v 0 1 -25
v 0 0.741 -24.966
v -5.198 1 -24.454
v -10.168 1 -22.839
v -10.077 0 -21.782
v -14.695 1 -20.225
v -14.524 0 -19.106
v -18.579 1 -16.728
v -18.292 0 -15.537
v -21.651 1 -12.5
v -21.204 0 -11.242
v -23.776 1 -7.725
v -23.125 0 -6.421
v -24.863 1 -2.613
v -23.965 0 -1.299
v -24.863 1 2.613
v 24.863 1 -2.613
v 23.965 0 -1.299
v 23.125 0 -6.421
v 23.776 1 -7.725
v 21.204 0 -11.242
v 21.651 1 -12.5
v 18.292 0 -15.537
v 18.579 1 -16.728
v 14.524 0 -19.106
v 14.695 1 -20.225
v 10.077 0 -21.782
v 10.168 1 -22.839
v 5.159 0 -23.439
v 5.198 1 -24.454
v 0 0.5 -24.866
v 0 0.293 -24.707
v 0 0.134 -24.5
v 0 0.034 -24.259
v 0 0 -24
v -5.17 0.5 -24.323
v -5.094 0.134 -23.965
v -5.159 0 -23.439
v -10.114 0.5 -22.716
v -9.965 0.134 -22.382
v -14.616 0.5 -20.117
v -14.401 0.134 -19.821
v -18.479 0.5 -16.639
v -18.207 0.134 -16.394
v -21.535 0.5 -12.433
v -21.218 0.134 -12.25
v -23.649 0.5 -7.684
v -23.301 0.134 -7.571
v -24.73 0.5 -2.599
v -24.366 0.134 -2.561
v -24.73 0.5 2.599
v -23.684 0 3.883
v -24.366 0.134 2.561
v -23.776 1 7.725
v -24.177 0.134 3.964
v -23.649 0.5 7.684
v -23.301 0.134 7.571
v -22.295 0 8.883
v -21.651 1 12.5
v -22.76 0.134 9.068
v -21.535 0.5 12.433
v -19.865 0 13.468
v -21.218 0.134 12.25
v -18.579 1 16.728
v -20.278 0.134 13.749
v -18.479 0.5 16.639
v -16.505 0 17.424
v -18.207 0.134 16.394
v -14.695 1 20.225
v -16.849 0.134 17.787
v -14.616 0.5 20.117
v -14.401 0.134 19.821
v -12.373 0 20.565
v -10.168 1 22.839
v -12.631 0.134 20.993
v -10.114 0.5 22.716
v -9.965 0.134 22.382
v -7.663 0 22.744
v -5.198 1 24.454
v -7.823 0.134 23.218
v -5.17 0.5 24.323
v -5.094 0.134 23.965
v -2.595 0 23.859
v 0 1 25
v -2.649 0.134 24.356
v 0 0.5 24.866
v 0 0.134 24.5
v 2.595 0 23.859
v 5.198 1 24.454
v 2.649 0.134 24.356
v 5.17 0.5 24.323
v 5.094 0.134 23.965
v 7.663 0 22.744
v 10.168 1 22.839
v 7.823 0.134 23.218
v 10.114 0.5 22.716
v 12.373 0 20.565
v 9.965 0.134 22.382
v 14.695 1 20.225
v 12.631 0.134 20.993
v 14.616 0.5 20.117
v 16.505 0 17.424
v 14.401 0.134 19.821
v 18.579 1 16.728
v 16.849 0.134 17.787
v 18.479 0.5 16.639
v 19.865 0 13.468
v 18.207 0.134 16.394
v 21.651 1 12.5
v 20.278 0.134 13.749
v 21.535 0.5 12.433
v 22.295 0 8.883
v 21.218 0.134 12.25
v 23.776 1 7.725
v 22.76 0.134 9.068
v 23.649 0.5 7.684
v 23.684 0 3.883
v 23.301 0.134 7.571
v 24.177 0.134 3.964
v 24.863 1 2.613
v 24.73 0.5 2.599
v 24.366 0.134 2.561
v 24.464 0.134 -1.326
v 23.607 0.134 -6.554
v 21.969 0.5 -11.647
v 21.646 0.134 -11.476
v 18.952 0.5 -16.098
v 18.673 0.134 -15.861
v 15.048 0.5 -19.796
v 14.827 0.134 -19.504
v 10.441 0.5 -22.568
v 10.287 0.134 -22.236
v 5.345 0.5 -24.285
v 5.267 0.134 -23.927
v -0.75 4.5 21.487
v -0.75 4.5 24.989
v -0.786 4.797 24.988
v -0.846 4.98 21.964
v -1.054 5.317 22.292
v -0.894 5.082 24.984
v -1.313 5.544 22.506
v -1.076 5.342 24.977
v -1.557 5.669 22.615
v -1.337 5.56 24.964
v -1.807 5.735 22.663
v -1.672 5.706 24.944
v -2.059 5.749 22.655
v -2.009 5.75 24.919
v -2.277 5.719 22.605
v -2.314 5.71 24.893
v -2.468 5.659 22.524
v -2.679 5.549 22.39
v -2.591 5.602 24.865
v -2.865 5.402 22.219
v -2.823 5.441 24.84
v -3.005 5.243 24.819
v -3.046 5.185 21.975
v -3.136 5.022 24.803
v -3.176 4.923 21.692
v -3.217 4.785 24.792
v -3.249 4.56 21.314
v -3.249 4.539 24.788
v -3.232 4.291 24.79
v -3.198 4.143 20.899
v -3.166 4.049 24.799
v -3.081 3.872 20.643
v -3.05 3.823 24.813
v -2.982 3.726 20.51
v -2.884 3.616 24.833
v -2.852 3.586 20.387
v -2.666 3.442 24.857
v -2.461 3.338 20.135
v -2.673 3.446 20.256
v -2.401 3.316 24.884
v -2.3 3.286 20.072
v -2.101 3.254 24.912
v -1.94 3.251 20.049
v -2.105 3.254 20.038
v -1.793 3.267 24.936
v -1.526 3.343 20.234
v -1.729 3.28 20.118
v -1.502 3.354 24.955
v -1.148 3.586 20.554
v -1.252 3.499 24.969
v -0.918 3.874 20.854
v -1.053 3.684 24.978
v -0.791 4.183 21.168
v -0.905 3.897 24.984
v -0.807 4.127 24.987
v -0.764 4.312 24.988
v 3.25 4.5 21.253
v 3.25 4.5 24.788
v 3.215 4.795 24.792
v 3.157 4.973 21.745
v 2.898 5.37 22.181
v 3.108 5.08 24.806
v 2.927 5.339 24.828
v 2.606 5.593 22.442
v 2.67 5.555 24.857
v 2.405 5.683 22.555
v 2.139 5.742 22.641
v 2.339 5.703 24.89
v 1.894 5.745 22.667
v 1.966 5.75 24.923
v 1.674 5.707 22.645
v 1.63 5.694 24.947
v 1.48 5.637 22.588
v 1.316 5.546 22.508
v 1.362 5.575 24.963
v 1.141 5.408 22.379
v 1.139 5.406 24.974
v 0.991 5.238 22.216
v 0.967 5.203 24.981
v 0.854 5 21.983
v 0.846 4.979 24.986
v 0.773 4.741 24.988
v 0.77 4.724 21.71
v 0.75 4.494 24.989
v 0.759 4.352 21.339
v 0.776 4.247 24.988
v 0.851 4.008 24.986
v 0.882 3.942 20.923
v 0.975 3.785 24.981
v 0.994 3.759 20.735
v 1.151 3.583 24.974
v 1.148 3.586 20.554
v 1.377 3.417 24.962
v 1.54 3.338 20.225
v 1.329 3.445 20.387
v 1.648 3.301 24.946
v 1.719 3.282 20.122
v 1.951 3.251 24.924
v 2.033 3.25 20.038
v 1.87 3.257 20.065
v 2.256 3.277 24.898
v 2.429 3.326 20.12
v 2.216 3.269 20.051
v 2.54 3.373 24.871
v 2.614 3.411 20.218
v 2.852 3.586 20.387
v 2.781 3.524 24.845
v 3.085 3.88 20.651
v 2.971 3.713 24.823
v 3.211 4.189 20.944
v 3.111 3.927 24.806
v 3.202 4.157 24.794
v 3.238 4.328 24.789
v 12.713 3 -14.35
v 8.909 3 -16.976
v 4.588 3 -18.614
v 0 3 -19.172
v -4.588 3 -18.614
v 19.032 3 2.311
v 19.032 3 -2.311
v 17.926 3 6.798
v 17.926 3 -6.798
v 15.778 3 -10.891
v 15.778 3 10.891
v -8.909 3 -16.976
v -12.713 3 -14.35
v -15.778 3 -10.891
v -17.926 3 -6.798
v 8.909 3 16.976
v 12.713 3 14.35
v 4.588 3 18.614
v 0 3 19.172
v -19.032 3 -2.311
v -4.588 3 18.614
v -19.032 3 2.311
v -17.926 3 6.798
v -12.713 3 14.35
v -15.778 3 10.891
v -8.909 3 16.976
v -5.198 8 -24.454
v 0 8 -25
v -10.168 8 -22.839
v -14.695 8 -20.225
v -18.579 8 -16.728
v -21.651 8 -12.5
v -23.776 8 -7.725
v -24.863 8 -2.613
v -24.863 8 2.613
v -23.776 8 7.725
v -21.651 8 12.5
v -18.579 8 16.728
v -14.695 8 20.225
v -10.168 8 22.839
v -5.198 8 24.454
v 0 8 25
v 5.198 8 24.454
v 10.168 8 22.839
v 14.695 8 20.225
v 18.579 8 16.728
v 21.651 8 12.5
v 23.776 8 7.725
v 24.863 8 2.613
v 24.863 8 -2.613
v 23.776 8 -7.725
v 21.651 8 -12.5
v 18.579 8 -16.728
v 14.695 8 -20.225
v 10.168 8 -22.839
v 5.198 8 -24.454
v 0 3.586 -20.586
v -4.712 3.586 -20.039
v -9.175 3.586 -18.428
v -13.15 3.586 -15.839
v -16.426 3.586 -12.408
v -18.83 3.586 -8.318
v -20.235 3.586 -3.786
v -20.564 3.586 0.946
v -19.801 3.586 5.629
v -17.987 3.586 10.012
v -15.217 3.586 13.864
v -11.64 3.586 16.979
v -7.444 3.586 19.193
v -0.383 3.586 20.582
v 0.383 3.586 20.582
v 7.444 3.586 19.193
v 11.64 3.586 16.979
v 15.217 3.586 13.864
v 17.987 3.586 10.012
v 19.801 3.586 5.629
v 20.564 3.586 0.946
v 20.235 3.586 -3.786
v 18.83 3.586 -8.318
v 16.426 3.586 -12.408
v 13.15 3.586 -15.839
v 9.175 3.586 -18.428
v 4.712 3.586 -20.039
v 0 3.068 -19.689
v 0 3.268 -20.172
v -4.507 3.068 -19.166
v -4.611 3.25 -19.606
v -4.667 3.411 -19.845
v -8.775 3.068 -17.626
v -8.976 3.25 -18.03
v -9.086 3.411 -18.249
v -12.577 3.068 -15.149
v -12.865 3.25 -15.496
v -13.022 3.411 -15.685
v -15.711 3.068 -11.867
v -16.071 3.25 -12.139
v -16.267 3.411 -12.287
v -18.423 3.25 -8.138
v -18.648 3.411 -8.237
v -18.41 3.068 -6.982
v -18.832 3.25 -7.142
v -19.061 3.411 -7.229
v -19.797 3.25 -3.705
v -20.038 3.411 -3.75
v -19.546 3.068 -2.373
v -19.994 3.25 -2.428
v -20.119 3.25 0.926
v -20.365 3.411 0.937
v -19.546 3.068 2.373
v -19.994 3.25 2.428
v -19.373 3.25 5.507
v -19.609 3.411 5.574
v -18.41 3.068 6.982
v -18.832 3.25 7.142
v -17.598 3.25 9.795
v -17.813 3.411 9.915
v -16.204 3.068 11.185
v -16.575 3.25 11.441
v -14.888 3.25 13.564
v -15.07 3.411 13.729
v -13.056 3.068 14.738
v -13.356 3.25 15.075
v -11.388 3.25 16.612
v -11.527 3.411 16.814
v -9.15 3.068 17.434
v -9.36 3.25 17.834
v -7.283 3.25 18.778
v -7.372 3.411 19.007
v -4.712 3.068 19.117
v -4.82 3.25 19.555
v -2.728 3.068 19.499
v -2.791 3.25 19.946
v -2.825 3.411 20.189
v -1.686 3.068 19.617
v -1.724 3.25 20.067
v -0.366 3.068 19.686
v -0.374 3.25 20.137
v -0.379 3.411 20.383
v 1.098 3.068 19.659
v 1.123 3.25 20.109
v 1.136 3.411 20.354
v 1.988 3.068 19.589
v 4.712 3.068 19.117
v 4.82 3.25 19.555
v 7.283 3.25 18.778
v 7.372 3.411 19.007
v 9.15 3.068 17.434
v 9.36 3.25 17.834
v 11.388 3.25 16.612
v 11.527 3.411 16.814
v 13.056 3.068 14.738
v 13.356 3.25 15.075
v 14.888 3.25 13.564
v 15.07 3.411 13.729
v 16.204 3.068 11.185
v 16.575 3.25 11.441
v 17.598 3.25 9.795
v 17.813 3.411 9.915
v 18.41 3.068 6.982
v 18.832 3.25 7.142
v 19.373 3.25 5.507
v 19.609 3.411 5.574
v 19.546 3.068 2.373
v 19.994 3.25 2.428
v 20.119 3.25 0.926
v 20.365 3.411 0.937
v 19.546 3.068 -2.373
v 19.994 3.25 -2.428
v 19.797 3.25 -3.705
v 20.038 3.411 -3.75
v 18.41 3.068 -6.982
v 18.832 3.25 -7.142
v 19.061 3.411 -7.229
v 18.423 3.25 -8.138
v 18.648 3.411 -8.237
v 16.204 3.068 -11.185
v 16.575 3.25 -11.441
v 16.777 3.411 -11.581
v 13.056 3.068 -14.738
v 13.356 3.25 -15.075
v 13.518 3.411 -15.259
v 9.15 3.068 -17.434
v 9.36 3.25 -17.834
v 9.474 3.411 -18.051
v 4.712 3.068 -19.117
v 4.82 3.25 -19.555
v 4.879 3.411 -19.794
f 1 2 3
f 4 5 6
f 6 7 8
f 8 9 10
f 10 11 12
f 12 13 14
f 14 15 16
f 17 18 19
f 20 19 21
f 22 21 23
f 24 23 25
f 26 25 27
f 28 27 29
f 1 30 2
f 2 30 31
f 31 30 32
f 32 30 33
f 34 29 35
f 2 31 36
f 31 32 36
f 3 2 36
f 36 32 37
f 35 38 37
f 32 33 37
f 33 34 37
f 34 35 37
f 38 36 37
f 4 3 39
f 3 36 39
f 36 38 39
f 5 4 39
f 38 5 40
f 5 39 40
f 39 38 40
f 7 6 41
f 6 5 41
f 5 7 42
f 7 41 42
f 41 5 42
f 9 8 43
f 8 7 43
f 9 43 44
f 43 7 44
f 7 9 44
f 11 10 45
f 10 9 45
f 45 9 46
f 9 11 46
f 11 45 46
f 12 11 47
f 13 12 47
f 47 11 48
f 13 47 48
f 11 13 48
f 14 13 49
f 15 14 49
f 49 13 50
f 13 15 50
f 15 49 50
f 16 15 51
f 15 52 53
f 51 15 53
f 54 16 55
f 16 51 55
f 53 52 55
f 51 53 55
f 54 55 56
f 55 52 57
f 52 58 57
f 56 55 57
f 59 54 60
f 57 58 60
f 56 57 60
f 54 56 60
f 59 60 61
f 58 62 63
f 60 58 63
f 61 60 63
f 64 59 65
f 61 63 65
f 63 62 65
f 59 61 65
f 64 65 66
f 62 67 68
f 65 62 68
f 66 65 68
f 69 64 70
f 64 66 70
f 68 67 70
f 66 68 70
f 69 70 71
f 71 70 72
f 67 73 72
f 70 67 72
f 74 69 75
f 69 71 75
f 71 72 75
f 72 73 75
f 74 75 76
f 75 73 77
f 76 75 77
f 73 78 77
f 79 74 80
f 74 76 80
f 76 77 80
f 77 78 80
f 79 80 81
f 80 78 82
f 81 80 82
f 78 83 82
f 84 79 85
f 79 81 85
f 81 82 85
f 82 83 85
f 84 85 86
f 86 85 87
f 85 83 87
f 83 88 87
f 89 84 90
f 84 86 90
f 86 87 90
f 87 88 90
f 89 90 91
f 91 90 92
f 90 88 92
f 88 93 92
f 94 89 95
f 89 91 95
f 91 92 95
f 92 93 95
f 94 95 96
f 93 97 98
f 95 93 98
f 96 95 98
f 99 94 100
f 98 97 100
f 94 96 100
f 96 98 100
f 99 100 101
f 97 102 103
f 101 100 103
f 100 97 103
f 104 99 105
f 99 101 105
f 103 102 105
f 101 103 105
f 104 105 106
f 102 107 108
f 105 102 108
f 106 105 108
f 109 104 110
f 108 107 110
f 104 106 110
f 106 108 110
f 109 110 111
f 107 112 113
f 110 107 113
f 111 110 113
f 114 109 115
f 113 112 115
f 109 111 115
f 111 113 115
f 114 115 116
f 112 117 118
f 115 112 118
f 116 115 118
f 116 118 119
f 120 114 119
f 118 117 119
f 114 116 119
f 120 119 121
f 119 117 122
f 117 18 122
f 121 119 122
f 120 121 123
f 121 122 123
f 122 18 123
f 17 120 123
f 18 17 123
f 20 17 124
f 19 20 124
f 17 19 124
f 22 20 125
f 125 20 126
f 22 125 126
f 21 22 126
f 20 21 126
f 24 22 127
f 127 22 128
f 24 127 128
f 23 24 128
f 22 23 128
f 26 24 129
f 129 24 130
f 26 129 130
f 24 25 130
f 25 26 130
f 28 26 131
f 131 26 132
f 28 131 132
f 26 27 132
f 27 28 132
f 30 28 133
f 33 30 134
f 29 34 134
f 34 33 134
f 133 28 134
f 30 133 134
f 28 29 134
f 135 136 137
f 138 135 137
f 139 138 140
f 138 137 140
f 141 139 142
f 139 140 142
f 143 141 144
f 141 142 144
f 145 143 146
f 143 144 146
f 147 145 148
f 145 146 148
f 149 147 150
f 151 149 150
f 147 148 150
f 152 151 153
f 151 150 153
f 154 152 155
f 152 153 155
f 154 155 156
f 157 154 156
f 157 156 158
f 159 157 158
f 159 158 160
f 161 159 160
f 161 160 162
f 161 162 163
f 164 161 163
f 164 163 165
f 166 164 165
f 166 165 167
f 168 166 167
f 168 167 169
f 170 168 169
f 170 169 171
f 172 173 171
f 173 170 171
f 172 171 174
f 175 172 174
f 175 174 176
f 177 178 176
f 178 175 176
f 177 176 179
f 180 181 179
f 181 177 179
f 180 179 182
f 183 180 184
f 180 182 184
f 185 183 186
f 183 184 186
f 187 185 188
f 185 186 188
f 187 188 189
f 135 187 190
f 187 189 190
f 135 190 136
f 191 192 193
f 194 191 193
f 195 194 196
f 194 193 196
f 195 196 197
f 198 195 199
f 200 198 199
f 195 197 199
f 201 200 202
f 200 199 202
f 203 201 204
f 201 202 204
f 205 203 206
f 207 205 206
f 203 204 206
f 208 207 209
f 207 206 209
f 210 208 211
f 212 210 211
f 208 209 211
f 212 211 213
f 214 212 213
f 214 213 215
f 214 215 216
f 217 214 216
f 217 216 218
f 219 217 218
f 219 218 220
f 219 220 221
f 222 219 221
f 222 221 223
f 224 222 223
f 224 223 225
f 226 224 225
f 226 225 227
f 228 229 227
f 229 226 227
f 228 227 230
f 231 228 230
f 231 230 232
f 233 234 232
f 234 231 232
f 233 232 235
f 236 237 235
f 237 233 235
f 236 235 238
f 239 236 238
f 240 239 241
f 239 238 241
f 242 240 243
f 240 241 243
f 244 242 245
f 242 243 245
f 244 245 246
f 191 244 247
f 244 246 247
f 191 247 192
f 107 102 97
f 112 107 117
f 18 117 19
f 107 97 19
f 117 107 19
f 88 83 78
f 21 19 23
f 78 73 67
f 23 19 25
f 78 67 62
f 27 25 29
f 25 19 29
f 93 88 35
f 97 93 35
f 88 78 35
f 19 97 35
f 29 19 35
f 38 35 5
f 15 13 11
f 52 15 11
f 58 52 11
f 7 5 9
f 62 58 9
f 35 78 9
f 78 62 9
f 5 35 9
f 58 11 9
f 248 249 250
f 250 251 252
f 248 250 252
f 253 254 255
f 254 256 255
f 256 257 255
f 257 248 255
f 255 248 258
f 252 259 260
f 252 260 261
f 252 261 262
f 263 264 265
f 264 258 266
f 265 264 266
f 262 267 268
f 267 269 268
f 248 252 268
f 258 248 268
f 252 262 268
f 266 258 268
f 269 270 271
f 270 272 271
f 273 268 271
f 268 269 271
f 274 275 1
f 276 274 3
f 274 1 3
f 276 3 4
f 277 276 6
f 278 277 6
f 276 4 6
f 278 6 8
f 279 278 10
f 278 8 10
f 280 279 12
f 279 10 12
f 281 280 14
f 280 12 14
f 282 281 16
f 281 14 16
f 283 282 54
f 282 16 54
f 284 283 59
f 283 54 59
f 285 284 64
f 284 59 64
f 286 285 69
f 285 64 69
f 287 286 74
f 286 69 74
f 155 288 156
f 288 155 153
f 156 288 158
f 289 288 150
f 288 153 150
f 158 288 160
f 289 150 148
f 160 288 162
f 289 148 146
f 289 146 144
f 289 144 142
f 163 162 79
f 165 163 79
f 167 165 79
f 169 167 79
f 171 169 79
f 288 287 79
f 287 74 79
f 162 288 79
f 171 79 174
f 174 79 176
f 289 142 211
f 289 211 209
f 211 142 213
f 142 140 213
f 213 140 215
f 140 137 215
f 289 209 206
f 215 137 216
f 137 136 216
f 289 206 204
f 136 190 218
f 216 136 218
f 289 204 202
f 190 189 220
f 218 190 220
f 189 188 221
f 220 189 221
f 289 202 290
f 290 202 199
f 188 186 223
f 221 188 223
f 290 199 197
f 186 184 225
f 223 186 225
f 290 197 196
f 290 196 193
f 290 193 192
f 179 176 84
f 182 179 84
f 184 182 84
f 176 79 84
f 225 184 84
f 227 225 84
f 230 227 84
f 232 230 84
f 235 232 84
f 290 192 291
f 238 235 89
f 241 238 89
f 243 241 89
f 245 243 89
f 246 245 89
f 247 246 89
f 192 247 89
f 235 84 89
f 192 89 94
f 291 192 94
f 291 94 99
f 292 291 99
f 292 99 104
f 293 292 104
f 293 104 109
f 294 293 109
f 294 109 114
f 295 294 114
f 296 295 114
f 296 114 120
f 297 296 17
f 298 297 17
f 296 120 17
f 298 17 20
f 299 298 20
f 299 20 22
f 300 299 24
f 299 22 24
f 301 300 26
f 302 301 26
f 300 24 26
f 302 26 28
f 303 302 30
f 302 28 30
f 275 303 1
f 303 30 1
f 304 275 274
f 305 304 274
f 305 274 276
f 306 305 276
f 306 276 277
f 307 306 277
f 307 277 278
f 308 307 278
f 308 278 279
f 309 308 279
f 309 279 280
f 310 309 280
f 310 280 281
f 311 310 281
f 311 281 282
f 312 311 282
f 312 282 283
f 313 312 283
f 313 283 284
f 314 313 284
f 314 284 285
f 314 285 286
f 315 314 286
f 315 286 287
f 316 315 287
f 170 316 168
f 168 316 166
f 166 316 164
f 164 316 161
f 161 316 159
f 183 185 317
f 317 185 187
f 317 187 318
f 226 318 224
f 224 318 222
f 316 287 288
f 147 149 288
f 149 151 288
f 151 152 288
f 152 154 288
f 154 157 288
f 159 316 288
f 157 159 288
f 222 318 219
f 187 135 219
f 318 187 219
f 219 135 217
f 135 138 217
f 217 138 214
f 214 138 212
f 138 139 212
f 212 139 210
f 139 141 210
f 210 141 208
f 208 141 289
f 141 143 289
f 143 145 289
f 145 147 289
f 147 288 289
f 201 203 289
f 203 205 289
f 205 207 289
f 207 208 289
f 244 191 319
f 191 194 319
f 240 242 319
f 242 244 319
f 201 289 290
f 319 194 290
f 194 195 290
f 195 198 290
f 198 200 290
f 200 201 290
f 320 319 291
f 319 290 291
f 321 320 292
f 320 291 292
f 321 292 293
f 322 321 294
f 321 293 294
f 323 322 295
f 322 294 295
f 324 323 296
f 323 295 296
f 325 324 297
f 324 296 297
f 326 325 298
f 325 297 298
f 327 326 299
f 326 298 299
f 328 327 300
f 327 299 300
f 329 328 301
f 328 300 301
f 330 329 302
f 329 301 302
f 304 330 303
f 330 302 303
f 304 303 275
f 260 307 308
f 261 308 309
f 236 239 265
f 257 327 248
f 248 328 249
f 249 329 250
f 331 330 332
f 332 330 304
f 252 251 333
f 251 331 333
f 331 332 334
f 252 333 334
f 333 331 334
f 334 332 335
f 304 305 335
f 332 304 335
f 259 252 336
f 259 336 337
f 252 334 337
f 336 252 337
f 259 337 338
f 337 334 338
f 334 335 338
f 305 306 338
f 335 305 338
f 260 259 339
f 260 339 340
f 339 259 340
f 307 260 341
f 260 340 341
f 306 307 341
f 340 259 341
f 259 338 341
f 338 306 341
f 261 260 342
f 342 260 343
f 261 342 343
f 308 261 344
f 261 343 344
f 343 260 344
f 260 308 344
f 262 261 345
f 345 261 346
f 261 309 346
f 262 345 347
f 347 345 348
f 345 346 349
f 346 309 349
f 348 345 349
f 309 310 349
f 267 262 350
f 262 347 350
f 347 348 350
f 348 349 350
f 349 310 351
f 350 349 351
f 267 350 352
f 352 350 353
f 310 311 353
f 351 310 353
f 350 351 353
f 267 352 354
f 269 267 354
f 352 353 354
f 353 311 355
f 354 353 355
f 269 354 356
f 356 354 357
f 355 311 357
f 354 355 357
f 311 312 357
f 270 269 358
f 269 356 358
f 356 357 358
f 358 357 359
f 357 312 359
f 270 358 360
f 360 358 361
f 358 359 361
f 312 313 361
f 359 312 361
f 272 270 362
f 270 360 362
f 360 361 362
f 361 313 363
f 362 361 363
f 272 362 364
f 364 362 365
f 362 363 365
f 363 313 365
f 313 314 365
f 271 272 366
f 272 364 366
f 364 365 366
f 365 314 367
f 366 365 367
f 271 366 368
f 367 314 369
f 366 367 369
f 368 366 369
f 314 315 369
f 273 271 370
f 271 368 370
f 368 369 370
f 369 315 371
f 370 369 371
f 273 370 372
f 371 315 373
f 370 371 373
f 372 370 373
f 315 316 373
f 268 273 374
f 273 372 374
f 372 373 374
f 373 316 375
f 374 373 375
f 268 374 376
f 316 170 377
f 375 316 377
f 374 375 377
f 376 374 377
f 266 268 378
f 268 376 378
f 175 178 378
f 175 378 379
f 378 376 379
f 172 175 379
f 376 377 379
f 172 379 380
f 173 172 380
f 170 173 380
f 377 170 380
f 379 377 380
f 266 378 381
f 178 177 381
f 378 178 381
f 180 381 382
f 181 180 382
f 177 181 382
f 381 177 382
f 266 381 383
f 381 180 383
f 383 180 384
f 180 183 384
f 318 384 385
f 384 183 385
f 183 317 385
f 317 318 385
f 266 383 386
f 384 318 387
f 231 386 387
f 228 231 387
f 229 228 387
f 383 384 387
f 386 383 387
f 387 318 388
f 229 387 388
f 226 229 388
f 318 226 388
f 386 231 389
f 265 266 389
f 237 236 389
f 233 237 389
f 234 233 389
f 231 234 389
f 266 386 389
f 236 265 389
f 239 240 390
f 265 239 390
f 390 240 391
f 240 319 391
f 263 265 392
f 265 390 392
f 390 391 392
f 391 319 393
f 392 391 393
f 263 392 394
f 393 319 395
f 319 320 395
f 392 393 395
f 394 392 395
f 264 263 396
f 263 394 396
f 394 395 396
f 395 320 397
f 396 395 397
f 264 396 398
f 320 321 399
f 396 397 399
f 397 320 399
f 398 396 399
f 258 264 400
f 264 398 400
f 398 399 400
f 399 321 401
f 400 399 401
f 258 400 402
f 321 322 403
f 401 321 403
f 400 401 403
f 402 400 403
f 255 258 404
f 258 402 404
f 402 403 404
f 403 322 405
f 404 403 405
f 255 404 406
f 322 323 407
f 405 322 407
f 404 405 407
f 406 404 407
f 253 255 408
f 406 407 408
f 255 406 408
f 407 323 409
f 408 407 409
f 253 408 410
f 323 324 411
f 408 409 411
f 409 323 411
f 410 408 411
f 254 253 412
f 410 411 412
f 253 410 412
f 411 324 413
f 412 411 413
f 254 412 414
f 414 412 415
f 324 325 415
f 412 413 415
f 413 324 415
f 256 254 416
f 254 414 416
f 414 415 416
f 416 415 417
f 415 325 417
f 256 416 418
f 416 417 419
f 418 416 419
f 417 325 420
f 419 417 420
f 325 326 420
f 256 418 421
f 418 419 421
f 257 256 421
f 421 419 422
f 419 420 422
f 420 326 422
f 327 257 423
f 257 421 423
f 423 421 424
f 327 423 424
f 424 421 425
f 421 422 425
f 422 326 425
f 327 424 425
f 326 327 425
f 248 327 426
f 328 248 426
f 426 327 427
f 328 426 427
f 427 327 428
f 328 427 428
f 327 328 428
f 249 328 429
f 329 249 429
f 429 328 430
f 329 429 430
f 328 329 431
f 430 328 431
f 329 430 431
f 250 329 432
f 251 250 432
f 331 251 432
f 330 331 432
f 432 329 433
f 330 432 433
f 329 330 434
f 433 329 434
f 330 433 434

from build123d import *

# Parameters (mm, degrees)
CUT_EXTRUDE1_REACH = 58.471
SKETCH5_R          = 1.25


with BuildPart() as part:
    # Sketch3 → Revolve3 (revolve)
    with BuildSketch(Plane.XY, mode=Mode.PRIVATE) as revolve3_sk:
        with BuildLine():
            Line((-23, 0), (0, 0))
            Line((0, 0), (0, 3))
            Line((0, 3), (-19.171572875, 3))
            ThreePointArc((-19.171572875, 3), (-19.93693974, 3.152240935), (-20.585786438, 3.585786438))
            Line((-20.585786438, 3.585786438), (-25, 8))
            Line((-25, 8), (-25, 1))
            ThreePointArc((-25, 1), (-24.707106781, 0.292893219), (-24, 0))
            Line((-24, 0), (-23, 0))
        make_face()
    revolve(revolve3_sk.sketch.rotate(Axis((0, 0, 0), (0, 1, 0)), 270), axis=Axis((0, 0, 0), (0, 1, 0)))

    # Sketch5 → Cut-Extrude1 (cut, up to next)
    with BuildSketch(Plane.XY.offset(25), mode=Mode.PRIVATE) as cut_extrude1_sk1:
        with Locations((-2, 4.5)):
            Circle(SKETCH5_R)
    cut_extrude1_tool1 = extrude(cut_extrude1_sk1.sketch, amount=-CUT_EXTRUDE1_REACH, mode=Mode.PRIVATE) & part.part
    # Sketch5 → Cut-Extrude1 (cut, up to next)
    with BuildSketch(Plane.XY.offset(25), mode=Mode.PRIVATE) as cut_extrude1_sk2:
        with Locations((2, 4.5)):
            Circle(SKETCH5_R)
    cut_extrude1_tool2 = extrude(cut_extrude1_sk2.sketch, amount=-CUT_EXTRUDE1_REACH, mode=Mode.PRIVATE) & part.part
    add(cut_extrude1_tool1.solids().sort_by_distance((-2, 4.5, 25))[0], mode=Mode.SUBTRACT)
    add(cut_extrude1_tool2.solids().sort_by_distance((2, 4.5, 25))[0], mode=Mode.SUBTRACT)


solid = part.part
